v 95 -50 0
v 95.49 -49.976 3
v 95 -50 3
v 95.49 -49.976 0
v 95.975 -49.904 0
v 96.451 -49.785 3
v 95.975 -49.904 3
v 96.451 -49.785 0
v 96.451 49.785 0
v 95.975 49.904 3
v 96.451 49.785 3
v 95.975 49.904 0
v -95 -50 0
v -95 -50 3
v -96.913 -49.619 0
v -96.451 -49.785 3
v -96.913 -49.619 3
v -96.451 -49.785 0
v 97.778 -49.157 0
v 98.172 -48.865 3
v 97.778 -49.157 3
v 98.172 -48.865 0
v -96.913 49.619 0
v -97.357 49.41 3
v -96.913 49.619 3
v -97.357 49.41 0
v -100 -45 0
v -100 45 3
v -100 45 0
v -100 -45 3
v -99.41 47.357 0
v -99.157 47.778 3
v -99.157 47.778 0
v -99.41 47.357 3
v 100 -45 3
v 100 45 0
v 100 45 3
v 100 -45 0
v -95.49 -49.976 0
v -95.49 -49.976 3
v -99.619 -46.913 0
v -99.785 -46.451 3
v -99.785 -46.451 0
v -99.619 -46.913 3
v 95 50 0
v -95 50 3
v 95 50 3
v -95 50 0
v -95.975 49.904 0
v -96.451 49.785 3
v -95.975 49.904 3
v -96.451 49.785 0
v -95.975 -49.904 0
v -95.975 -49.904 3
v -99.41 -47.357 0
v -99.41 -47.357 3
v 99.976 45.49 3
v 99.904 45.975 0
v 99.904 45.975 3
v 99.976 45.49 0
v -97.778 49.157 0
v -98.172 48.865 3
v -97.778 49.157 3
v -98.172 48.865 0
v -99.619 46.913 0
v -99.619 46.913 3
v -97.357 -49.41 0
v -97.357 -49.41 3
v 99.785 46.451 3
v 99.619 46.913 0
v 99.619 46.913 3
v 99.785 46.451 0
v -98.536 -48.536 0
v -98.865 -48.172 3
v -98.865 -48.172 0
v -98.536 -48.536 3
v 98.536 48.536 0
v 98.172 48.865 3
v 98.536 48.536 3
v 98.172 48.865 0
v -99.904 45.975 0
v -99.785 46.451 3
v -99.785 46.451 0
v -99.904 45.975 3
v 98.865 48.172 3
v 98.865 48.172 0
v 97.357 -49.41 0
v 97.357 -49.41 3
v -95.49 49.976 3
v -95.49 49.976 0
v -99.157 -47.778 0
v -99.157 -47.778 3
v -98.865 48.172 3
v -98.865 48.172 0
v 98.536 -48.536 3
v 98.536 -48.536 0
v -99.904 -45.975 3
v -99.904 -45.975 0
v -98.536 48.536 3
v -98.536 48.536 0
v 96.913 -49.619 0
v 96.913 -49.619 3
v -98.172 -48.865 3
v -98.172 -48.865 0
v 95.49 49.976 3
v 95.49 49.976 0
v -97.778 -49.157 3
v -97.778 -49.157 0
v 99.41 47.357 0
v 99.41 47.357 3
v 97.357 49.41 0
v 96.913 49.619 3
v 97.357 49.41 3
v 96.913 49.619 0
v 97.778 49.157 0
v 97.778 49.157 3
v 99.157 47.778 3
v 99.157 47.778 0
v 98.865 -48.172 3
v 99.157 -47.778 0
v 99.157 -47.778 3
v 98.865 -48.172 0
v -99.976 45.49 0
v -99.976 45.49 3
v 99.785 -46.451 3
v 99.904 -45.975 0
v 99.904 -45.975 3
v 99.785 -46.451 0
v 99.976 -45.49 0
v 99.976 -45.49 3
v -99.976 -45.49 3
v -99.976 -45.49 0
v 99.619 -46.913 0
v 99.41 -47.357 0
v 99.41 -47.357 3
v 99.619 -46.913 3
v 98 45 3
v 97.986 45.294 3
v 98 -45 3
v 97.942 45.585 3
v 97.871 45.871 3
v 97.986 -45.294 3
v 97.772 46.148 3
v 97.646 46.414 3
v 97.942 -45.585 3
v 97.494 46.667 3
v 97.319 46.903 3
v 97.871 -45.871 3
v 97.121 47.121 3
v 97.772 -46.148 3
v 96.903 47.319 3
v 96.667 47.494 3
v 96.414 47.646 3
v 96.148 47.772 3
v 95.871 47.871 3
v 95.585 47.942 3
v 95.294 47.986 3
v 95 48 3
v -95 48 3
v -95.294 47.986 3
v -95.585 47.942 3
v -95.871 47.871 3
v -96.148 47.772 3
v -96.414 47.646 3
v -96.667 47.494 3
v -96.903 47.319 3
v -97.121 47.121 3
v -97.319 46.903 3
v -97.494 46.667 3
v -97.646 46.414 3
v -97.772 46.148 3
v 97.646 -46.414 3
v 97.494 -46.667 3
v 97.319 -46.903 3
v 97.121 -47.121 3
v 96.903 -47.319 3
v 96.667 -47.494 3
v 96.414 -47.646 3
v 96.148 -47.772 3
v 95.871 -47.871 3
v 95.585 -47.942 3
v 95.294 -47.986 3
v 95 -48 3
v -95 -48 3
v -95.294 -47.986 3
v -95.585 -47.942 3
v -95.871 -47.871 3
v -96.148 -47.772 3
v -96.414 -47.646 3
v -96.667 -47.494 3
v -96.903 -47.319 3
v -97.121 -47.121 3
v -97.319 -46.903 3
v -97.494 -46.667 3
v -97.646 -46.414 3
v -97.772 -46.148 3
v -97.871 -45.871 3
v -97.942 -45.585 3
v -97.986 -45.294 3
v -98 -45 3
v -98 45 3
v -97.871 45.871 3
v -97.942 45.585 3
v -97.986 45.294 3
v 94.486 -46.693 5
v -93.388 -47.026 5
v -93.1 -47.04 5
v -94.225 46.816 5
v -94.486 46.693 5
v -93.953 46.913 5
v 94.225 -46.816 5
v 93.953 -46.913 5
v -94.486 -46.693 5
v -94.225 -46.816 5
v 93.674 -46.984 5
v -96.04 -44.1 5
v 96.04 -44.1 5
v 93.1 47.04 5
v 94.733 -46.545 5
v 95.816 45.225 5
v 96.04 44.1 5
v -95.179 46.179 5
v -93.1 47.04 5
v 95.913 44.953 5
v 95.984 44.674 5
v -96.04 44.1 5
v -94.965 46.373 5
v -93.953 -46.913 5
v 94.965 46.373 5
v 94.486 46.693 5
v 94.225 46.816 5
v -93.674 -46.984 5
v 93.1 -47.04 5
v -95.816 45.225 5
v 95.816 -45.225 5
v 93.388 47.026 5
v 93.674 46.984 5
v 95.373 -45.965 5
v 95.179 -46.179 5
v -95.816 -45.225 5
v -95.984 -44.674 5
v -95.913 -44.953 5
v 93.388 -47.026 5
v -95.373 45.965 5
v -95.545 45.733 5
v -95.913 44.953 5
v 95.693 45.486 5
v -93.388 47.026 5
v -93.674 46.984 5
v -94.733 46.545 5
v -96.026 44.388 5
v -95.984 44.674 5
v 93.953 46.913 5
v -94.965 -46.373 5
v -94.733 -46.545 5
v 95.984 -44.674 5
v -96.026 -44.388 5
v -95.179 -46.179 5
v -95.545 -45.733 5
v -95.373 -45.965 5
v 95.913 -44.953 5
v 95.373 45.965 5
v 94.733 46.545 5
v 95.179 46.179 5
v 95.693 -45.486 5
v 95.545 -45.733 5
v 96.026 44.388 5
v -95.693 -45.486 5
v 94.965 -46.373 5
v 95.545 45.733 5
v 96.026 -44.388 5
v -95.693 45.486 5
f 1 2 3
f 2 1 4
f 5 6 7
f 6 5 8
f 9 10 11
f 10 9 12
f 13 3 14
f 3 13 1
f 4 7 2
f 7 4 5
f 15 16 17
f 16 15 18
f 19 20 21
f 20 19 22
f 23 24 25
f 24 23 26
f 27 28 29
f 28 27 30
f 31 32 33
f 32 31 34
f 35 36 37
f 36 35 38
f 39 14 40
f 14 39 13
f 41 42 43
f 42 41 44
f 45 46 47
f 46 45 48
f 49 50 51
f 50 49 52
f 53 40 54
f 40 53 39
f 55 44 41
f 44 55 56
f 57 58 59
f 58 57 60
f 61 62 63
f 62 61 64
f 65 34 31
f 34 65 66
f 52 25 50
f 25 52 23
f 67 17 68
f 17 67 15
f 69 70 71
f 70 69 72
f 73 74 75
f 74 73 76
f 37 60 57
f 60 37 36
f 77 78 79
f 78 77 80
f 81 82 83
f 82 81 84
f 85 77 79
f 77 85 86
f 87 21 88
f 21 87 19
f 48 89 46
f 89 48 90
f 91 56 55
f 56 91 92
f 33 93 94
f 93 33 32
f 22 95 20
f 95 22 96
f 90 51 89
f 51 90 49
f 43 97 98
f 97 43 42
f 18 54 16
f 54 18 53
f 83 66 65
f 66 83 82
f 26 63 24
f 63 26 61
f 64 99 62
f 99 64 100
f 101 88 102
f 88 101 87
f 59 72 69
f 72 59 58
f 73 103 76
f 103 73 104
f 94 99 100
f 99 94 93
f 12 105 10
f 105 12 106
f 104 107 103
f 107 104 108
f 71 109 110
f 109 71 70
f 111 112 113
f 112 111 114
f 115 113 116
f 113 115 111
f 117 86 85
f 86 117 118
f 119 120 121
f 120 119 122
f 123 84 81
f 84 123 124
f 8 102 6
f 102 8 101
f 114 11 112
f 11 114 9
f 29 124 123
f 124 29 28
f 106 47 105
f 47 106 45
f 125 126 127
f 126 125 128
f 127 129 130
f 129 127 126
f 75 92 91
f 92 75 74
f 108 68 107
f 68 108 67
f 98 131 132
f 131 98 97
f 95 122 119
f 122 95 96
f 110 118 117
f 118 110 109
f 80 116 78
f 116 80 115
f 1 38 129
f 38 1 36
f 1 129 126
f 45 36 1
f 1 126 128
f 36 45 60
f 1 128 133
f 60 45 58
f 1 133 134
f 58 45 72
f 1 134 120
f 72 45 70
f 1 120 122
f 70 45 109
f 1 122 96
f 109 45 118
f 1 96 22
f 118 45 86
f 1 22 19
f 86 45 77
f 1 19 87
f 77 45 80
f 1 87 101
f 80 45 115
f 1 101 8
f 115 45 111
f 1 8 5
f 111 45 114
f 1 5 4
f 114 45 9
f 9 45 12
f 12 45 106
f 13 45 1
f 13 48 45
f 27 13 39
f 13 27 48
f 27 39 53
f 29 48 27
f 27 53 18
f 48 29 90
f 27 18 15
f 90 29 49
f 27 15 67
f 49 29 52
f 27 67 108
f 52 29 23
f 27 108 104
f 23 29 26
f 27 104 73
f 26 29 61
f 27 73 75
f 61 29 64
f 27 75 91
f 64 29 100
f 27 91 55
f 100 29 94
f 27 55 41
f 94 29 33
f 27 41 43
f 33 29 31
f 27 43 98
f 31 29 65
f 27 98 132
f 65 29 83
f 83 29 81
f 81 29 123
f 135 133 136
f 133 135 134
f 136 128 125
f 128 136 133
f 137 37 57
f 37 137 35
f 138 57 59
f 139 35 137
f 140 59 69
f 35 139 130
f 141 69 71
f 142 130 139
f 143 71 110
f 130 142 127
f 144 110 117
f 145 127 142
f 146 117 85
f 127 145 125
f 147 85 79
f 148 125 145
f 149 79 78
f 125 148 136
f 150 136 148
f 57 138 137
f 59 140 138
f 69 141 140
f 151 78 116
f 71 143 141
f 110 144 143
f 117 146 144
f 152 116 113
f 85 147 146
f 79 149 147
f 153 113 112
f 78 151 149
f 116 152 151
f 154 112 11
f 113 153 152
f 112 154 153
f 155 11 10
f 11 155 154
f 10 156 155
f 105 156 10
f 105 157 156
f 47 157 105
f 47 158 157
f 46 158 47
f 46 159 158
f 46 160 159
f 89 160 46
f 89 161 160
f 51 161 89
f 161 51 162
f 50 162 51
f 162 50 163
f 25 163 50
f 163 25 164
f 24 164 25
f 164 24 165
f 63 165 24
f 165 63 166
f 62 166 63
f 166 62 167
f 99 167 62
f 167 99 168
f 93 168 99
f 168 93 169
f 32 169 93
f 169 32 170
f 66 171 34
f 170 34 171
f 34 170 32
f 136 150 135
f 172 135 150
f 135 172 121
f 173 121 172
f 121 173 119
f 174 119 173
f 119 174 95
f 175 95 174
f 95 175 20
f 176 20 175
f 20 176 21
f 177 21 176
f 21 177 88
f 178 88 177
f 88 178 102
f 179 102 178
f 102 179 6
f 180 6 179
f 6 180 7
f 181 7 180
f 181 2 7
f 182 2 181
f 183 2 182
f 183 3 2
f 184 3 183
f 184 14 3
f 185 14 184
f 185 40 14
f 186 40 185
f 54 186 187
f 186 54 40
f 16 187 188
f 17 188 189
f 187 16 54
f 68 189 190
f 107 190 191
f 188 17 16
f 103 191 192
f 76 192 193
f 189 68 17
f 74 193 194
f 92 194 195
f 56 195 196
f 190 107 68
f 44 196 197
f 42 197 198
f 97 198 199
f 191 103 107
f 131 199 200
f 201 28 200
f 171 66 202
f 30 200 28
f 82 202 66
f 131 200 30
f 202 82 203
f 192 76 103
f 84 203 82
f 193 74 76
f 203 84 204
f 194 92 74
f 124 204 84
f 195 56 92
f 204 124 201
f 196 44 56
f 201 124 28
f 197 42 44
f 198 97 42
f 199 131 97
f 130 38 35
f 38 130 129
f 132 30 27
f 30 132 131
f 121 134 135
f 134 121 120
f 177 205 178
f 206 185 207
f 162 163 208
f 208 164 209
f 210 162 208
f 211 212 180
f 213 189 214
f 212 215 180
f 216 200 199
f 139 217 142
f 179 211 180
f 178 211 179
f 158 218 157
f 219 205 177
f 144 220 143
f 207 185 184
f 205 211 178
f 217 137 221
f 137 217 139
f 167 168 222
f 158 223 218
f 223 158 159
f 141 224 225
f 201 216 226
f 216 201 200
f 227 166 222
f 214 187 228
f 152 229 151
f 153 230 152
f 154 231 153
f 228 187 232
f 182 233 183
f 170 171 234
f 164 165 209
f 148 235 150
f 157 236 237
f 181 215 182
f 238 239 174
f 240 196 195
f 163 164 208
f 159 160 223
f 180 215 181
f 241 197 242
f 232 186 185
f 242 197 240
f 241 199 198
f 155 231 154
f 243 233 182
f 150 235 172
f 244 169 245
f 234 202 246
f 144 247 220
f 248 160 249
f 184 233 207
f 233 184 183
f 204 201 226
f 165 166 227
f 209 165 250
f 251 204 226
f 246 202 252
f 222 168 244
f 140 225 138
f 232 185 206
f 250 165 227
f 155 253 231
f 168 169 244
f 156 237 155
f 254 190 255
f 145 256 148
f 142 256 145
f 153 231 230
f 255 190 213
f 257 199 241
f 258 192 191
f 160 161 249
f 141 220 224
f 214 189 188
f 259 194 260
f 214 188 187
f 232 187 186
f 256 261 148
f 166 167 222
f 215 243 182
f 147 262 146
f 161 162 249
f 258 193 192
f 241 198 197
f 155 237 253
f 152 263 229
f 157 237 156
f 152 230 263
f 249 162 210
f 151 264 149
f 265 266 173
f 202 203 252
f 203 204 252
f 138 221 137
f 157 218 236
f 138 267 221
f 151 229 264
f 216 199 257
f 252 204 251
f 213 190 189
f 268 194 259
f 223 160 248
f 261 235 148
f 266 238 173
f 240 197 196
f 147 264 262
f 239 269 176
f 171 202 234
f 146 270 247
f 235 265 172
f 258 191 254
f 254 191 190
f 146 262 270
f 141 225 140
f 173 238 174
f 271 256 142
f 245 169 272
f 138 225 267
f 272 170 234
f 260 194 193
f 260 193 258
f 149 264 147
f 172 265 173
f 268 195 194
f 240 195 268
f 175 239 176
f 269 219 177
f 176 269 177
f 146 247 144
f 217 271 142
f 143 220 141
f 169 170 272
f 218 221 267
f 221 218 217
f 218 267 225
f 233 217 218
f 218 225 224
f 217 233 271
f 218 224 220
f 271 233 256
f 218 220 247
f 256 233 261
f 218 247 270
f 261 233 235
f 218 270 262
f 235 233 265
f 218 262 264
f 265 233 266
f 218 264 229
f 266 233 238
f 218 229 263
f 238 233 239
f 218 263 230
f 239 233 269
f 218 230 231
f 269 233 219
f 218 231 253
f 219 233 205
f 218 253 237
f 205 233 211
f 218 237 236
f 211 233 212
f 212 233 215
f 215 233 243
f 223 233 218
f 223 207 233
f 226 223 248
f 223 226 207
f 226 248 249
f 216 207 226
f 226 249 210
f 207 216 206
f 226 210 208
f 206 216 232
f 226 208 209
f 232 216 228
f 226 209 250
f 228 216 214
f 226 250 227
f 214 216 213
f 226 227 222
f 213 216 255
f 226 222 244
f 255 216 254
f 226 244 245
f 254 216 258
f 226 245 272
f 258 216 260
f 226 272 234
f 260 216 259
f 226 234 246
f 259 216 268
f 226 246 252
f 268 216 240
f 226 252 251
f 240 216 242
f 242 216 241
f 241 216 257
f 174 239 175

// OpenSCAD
// Sheet MDF (single connected solid, no text)

// Parameters
sheet_length    = 200;
sheet_width     = 100;
sheet_thickness = 5;

corner_radius   = 5;   // rounded corners
edge_chamfer    = 2;   // top-edge chamfer amount

$fn = 64;

// 2D rounded rectangle (solid)
module rounded_rect_2d(L, W, R) {
    R2 = min(R, min(L, W)/2);
    offset(r=R2)
        square([L - 2*R2, W - 2*R2], center=true);
}

// 3D sheet with rounded corners and a top chamfer (connected solid)
module mdf_sheet() {
    R = min(corner_radius, min(sheet_length, sheet_width)/2);
    c = min(edge_chamfer, sheet_thickness);

    union() {
        // Base slab up to (thickness - chamfer)
        linear_extrude(height = sheet_thickness - c)
            rounded_rect_2d(sheet_length, sheet_width, R);

        // Chamfered top section: slightly smaller footprint, placed to touch base
        translate([0, 0, sheet_thickness - c])
            linear_extrude(height = c, scale = (sheet_length - 2*c)/sheet_length)
                rounded_rect_2d(sheet_length - 2*c, sheet_width - 2*c, max(0, R - c));
    }
}

mdf_sheet();
